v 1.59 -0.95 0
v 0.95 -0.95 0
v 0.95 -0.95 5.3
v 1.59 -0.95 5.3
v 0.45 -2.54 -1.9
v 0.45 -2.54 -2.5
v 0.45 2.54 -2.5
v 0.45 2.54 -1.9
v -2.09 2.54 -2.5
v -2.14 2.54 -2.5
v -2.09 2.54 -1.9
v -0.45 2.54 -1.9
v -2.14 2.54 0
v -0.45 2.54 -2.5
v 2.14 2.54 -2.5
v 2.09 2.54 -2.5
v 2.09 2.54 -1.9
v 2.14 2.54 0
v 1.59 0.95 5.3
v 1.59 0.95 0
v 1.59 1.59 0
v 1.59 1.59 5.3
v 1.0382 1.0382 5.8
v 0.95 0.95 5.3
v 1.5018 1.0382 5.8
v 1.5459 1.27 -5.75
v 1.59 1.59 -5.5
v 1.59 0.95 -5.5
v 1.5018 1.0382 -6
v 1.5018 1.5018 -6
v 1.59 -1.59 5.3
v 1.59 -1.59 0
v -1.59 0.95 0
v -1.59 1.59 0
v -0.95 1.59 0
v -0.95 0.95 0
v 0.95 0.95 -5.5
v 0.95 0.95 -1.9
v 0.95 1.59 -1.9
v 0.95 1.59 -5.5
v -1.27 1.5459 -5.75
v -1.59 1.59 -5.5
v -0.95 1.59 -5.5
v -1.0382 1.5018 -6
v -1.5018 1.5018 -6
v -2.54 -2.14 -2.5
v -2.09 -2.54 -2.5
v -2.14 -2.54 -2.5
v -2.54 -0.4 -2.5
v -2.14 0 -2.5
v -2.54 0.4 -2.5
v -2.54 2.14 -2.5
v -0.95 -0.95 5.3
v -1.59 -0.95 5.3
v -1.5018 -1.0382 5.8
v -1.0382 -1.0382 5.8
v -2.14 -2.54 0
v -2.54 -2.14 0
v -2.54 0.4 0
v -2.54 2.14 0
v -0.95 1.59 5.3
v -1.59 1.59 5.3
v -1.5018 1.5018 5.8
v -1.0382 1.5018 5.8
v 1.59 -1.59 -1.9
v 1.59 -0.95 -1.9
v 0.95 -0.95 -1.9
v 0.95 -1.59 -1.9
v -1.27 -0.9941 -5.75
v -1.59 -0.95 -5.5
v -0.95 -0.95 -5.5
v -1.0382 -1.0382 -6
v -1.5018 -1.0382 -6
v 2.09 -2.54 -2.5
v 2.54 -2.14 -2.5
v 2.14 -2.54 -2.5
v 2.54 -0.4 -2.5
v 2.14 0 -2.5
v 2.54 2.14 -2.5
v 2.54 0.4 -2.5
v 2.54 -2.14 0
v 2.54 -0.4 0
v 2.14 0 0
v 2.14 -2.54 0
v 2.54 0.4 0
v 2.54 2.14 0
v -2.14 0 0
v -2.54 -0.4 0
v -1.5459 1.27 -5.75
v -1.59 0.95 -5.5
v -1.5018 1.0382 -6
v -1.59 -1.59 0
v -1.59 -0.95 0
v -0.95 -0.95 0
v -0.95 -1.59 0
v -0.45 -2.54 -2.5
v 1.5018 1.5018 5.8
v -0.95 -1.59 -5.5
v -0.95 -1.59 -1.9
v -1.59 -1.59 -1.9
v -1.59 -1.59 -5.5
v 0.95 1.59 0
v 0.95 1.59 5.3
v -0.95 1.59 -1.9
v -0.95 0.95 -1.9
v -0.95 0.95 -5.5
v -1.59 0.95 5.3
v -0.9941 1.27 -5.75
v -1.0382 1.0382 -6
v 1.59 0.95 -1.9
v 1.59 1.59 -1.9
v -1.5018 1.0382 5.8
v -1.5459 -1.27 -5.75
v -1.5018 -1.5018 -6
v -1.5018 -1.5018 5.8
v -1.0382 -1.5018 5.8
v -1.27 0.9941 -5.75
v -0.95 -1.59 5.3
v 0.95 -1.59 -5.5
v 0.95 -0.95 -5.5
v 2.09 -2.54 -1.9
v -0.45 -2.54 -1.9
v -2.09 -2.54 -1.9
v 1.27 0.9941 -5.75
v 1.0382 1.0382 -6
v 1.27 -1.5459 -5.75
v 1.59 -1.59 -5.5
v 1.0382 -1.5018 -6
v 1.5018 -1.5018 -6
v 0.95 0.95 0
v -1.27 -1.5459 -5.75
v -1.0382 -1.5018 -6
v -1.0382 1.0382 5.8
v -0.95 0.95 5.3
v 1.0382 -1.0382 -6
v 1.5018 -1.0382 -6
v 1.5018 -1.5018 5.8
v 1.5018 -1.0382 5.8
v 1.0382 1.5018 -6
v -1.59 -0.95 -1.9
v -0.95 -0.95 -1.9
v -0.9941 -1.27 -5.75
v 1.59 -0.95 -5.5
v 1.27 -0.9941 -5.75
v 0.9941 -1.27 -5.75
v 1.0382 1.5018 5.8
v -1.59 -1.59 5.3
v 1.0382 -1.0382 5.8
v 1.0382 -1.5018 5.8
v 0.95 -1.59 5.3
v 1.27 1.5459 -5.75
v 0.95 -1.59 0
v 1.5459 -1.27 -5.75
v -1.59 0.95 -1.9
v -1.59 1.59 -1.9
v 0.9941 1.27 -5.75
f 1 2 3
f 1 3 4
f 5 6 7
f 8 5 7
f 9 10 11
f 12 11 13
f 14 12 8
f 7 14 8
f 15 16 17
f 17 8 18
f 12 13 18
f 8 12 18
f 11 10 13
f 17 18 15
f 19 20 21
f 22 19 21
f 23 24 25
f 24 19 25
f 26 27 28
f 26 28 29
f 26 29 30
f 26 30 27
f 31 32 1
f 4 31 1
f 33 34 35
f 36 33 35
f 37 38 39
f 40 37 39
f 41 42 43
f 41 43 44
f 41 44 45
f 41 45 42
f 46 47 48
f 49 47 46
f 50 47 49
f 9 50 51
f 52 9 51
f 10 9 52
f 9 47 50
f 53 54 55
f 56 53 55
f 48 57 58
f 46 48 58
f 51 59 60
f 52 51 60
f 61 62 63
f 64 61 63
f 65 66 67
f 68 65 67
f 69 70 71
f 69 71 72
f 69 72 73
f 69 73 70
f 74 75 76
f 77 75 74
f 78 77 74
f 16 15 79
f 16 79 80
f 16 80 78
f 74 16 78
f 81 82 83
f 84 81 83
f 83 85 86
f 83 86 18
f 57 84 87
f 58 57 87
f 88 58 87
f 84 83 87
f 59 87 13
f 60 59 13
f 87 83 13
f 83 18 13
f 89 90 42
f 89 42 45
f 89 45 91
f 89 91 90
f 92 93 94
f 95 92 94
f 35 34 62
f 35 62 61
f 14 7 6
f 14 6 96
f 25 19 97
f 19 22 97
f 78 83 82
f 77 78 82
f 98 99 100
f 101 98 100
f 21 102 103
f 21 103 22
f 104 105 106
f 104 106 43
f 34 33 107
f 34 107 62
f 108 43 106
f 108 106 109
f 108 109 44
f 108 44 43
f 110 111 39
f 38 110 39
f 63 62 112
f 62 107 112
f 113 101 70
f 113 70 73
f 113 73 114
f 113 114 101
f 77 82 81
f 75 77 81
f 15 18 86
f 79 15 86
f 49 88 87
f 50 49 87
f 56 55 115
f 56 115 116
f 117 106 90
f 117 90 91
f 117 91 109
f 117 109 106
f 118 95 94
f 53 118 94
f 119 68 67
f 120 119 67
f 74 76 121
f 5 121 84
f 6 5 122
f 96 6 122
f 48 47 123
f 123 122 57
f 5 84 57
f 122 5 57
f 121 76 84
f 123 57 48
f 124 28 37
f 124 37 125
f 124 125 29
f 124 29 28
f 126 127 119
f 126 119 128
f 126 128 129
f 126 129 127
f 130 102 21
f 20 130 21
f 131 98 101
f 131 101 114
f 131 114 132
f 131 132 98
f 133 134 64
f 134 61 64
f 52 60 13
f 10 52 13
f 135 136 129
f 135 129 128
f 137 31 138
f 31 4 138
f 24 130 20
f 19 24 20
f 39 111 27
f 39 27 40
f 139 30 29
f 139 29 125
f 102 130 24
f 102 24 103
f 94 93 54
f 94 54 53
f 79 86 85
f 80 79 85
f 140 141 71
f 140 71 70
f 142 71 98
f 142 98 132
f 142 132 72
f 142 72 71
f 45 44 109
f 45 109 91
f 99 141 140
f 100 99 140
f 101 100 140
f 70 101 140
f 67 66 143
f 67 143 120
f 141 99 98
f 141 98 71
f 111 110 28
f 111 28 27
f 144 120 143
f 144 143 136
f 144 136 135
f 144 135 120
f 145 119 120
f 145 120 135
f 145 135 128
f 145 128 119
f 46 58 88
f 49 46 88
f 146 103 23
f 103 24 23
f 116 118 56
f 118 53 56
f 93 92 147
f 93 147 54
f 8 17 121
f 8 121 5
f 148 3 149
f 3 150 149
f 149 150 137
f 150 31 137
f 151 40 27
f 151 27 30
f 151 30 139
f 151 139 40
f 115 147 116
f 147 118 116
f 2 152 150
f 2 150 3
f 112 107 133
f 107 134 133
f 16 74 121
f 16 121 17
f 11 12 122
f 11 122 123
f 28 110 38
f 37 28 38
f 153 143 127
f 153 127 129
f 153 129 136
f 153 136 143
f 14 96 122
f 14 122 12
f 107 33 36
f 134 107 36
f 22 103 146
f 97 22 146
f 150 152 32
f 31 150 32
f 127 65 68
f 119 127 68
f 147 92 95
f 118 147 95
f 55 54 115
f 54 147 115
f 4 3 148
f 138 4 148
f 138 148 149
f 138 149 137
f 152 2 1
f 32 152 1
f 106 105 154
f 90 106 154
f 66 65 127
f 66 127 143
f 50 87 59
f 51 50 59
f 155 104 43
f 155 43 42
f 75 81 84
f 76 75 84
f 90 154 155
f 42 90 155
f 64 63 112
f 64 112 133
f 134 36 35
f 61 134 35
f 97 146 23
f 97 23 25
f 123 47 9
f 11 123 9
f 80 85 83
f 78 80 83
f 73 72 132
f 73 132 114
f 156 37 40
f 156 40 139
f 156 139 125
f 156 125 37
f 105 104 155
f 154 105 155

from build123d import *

# Parameters (mm, degrees)
SKETCH1_W             = 0.64
SKETCH1_H             = 0.64
BOSS_EXTRUDE1_DEPTH   = 5.3
BOSS_EXTRUDE1_2_DEPTH = 5.3
BOSS_EXTRUDE1_3_DEPTH = 5.3
BOSS_EXTRUDE1_4_DEPTH = 5.3
SKETCH2_W             = 0.64
SKETCH2_H             = 0.64
BOSS_EXTRUDE2_DEPTH   = 0.5
BOSS_EXTRUDE2_TAPER   = 10
BOSS_EXTRUDE3_DEPTH   = 2.5
SKETCH5_W             = 1.64
SKETCH5_H             = 5.08
CUT_EXTRUDE1_DEPTH    = 0.6
CUT_EXTRUDE3_DEPTH    = 3.5
SKETCH8_W             = 0.64
SKETCH8_H             = 0.64
BOSS_EXTRUDE4_DEPTH   = 3.6
BOSS_EXTRUDE4_2_DEPTH = 3.6
BOSS_EXTRUDE4_3_DEPTH = 3.6
BOSS_EXTRUDE4_4_DEPTH = 3.6
SKETCH9_W             = 0.64
SKETCH9_H             = 0.64
BOSS_EXTRUDE5_DEPTH   = 0.5
BOSS_EXTRUDE5_TAPER   = 10


with BuildPart() as part:
    # Sketch1 → Boss-Extrude1 (new body)
    with BuildSketch(Plane.XY):
        with Locations((-1.27, 1.27)):
            Rectangle(SKETCH1_W, SKETCH1_H)
    extrude(amount=BOSS_EXTRUDE1_DEPTH)



with BuildPart() as body_2:
    # Sketch1 → Boss-Extrude1 2 (new body)
    with BuildSketch(Plane.XY):
        with Locations((-1.27, -1.27)):
            Rectangle(SKETCH1_W, SKETCH1_H)
    extrude(amount=BOSS_EXTRUDE1_2_DEPTH)


with BuildPart() as body_3:
    # Sketch1 → Boss-Extrude1 3 (new body)
    with BuildSketch(Plane.XY):
        with Locations((1.27, 1.27)):
            Rectangle(SKETCH1_W, SKETCH1_H)
    extrude(amount=BOSS_EXTRUDE1_3_DEPTH)


with BuildPart() as body_4:
    # Sketch1 → Boss-Extrude1 4 (new body)
    with BuildSketch(Plane.XY):
        with Locations((1.27, -1.27)):
            Rectangle(SKETCH1_W, SKETCH1_H)
    extrude(amount=BOSS_EXTRUDE1_4_DEPTH)


with BuildPart() as part_1:
    add(part.part)

    add(body_2.part)  # Boss-Extrude2 merges body 2

    add(body_3.part)  # Boss-Extrude2 merges body 3

    add(body_4.part)  # Boss-Extrude2 merges body 4
    # Sketch2 → Boss-Extrude2 (add)
    with BuildSketch(Plane.XY.offset(5.3)):
        with Locations((-1.27, -1.27)):
            Rectangle(SKETCH2_W, SKETCH2_H)
        with Locations((-1.27, 1.27)):
            Rectangle(SKETCH2_W, SKETCH2_H)
        with Locations((1.27, -1.27)):
            Rectangle(SKETCH2_W, SKETCH2_H)
        with Locations((1.27, 1.27)):
            Rectangle(SKETCH2_W, SKETCH2_H)
    extrude(amount=BOSS_EXTRUDE2_DEPTH, taper=BOSS_EXTRUDE2_TAPER)


with BuildPart() as body_2_2:
    # Sketch3 → Boss-Extrude3 (new body)
    with BuildSketch(Plane.XY):
        Polygon((-2.14, 2.54), (2.14, 2.54), (2.54, 2.14), (2.54, -2.14), (2.14, -2.54), (-2.14, -2.54), (-2.54, -2.14), (-2.54, 2.14), align=None)
    extrude(amount=-BOSS_EXTRUDE3_DEPTH)

    # Sketch5 → Cut-Extrude1 (cut)
    with BuildSketch(Plane(origin=(0, 0, -2.5), x_dir=(-1, 0, 0), z_dir=(0, 0, -1))):
        with Locations((-1.27, 0)):
            Rectangle(SKETCH5_W, SKETCH5_H)
        with Locations((1.27, 0)):
            Rectangle(SKETCH5_W, SKETCH5_H)
    extrude(amount=-CUT_EXTRUDE1_DEPTH, mode=Mode.SUBTRACT)

    # Sketch7 → Cut-Extrude3 (cut, through all)
    with BuildSketch(Plane.XY):
        Polygon((2.54, 0), (2.54, 0.4), (2.14, 0), align=None)
        Polygon((2.54, 0), (2.14, 0), (2.54, -0.4), align=None)
        Polygon((-2.54, 0), (-2.54, -0.4), (-2.14, 0), align=None)
        Polygon((-2.54, 0.4), (-2.54, 0), (-2.14, 0), align=None)
    extrude(amount=-CUT_EXTRUDE3_DEPTH, mode=Mode.SUBTRACT)


with BuildPart() as body_3_2:
    # Sketch8 → Boss-Extrude4 (new body)
    with BuildSketch(Plane(origin=(0, 0, -1.9), x_dir=(-1, 0, 0), z_dir=(0, 0, -1))):
        with Locations((1.27, -1.27)):
            Rectangle(SKETCH8_W, SKETCH8_H)
    extrude(amount=BOSS_EXTRUDE4_DEPTH)



with BuildPart() as body_4_2:
    # Sketch8 → Boss-Extrude4 2 (new body)
    with BuildSketch(Plane(origin=(0, 0, -1.9), x_dir=(-1, 0, 0), z_dir=(0, 0, -1))):
        with Locations((1.27, 1.27)):
            Rectangle(SKETCH8_W, SKETCH8_H)
    extrude(amount=BOSS_EXTRUDE4_2_DEPTH)


with BuildPart() as body_5:
    # Sketch8 → Boss-Extrude4 3 (new body)
    with BuildSketch(Plane(origin=(0, 0, -1.9), x_dir=(-1, 0, 0), z_dir=(0, 0, -1))):
        with Locations((-1.27, 1.27)):
            Rectangle(SKETCH8_W, SKETCH8_H)
    extrude(amount=BOSS_EXTRUDE4_3_DEPTH)


with BuildPart() as body_6:
    # Sketch8 → Boss-Extrude4 4 (new body)
    with BuildSketch(Plane(origin=(0, 0, -1.9), x_dir=(-1, 0, 0), z_dir=(0, 0, -1))):
        with Locations((-1.27, -1.27)):
            Rectangle(SKETCH8_W, SKETCH8_H)
    extrude(amount=BOSS_EXTRUDE4_4_DEPTH)


with BuildPart() as body_3_2_1:
    add(body_3_2.part)

    add(body_4_2.part)  # Boss-Extrude5 merges body 4 2

    add(body_5.part)  # Boss-Extrude5 merges body 5

    add(body_6.part)  # Boss-Extrude5 merges body 6
    # Sketch9 → Boss-Extrude5 (add)
    with BuildSketch(Plane(origin=(0, 0, -5.5), x_dir=(-1, 0, 0), z_dir=(0, 0, -1))):
        with Locations((1.27, 1.27)):
            Rectangle(SKETCH9_W, SKETCH9_H)
        with Locations((1.27, -1.27)):
            Rectangle(SKETCH9_W, SKETCH9_H)
        with Locations((-1.27, -1.27)):
            Rectangle(SKETCH9_W, SKETCH9_H)
        with Locations((-1.27, 1.27)):
            Rectangle(SKETCH9_W, SKETCH9_H)
    extrude(amount=BOSS_EXTRUDE5_DEPTH, taper=BOSS_EXTRUDE5_TAPER)


solid = Compound([part_1.part, body_2_2.part, body_3_2_1.part])
